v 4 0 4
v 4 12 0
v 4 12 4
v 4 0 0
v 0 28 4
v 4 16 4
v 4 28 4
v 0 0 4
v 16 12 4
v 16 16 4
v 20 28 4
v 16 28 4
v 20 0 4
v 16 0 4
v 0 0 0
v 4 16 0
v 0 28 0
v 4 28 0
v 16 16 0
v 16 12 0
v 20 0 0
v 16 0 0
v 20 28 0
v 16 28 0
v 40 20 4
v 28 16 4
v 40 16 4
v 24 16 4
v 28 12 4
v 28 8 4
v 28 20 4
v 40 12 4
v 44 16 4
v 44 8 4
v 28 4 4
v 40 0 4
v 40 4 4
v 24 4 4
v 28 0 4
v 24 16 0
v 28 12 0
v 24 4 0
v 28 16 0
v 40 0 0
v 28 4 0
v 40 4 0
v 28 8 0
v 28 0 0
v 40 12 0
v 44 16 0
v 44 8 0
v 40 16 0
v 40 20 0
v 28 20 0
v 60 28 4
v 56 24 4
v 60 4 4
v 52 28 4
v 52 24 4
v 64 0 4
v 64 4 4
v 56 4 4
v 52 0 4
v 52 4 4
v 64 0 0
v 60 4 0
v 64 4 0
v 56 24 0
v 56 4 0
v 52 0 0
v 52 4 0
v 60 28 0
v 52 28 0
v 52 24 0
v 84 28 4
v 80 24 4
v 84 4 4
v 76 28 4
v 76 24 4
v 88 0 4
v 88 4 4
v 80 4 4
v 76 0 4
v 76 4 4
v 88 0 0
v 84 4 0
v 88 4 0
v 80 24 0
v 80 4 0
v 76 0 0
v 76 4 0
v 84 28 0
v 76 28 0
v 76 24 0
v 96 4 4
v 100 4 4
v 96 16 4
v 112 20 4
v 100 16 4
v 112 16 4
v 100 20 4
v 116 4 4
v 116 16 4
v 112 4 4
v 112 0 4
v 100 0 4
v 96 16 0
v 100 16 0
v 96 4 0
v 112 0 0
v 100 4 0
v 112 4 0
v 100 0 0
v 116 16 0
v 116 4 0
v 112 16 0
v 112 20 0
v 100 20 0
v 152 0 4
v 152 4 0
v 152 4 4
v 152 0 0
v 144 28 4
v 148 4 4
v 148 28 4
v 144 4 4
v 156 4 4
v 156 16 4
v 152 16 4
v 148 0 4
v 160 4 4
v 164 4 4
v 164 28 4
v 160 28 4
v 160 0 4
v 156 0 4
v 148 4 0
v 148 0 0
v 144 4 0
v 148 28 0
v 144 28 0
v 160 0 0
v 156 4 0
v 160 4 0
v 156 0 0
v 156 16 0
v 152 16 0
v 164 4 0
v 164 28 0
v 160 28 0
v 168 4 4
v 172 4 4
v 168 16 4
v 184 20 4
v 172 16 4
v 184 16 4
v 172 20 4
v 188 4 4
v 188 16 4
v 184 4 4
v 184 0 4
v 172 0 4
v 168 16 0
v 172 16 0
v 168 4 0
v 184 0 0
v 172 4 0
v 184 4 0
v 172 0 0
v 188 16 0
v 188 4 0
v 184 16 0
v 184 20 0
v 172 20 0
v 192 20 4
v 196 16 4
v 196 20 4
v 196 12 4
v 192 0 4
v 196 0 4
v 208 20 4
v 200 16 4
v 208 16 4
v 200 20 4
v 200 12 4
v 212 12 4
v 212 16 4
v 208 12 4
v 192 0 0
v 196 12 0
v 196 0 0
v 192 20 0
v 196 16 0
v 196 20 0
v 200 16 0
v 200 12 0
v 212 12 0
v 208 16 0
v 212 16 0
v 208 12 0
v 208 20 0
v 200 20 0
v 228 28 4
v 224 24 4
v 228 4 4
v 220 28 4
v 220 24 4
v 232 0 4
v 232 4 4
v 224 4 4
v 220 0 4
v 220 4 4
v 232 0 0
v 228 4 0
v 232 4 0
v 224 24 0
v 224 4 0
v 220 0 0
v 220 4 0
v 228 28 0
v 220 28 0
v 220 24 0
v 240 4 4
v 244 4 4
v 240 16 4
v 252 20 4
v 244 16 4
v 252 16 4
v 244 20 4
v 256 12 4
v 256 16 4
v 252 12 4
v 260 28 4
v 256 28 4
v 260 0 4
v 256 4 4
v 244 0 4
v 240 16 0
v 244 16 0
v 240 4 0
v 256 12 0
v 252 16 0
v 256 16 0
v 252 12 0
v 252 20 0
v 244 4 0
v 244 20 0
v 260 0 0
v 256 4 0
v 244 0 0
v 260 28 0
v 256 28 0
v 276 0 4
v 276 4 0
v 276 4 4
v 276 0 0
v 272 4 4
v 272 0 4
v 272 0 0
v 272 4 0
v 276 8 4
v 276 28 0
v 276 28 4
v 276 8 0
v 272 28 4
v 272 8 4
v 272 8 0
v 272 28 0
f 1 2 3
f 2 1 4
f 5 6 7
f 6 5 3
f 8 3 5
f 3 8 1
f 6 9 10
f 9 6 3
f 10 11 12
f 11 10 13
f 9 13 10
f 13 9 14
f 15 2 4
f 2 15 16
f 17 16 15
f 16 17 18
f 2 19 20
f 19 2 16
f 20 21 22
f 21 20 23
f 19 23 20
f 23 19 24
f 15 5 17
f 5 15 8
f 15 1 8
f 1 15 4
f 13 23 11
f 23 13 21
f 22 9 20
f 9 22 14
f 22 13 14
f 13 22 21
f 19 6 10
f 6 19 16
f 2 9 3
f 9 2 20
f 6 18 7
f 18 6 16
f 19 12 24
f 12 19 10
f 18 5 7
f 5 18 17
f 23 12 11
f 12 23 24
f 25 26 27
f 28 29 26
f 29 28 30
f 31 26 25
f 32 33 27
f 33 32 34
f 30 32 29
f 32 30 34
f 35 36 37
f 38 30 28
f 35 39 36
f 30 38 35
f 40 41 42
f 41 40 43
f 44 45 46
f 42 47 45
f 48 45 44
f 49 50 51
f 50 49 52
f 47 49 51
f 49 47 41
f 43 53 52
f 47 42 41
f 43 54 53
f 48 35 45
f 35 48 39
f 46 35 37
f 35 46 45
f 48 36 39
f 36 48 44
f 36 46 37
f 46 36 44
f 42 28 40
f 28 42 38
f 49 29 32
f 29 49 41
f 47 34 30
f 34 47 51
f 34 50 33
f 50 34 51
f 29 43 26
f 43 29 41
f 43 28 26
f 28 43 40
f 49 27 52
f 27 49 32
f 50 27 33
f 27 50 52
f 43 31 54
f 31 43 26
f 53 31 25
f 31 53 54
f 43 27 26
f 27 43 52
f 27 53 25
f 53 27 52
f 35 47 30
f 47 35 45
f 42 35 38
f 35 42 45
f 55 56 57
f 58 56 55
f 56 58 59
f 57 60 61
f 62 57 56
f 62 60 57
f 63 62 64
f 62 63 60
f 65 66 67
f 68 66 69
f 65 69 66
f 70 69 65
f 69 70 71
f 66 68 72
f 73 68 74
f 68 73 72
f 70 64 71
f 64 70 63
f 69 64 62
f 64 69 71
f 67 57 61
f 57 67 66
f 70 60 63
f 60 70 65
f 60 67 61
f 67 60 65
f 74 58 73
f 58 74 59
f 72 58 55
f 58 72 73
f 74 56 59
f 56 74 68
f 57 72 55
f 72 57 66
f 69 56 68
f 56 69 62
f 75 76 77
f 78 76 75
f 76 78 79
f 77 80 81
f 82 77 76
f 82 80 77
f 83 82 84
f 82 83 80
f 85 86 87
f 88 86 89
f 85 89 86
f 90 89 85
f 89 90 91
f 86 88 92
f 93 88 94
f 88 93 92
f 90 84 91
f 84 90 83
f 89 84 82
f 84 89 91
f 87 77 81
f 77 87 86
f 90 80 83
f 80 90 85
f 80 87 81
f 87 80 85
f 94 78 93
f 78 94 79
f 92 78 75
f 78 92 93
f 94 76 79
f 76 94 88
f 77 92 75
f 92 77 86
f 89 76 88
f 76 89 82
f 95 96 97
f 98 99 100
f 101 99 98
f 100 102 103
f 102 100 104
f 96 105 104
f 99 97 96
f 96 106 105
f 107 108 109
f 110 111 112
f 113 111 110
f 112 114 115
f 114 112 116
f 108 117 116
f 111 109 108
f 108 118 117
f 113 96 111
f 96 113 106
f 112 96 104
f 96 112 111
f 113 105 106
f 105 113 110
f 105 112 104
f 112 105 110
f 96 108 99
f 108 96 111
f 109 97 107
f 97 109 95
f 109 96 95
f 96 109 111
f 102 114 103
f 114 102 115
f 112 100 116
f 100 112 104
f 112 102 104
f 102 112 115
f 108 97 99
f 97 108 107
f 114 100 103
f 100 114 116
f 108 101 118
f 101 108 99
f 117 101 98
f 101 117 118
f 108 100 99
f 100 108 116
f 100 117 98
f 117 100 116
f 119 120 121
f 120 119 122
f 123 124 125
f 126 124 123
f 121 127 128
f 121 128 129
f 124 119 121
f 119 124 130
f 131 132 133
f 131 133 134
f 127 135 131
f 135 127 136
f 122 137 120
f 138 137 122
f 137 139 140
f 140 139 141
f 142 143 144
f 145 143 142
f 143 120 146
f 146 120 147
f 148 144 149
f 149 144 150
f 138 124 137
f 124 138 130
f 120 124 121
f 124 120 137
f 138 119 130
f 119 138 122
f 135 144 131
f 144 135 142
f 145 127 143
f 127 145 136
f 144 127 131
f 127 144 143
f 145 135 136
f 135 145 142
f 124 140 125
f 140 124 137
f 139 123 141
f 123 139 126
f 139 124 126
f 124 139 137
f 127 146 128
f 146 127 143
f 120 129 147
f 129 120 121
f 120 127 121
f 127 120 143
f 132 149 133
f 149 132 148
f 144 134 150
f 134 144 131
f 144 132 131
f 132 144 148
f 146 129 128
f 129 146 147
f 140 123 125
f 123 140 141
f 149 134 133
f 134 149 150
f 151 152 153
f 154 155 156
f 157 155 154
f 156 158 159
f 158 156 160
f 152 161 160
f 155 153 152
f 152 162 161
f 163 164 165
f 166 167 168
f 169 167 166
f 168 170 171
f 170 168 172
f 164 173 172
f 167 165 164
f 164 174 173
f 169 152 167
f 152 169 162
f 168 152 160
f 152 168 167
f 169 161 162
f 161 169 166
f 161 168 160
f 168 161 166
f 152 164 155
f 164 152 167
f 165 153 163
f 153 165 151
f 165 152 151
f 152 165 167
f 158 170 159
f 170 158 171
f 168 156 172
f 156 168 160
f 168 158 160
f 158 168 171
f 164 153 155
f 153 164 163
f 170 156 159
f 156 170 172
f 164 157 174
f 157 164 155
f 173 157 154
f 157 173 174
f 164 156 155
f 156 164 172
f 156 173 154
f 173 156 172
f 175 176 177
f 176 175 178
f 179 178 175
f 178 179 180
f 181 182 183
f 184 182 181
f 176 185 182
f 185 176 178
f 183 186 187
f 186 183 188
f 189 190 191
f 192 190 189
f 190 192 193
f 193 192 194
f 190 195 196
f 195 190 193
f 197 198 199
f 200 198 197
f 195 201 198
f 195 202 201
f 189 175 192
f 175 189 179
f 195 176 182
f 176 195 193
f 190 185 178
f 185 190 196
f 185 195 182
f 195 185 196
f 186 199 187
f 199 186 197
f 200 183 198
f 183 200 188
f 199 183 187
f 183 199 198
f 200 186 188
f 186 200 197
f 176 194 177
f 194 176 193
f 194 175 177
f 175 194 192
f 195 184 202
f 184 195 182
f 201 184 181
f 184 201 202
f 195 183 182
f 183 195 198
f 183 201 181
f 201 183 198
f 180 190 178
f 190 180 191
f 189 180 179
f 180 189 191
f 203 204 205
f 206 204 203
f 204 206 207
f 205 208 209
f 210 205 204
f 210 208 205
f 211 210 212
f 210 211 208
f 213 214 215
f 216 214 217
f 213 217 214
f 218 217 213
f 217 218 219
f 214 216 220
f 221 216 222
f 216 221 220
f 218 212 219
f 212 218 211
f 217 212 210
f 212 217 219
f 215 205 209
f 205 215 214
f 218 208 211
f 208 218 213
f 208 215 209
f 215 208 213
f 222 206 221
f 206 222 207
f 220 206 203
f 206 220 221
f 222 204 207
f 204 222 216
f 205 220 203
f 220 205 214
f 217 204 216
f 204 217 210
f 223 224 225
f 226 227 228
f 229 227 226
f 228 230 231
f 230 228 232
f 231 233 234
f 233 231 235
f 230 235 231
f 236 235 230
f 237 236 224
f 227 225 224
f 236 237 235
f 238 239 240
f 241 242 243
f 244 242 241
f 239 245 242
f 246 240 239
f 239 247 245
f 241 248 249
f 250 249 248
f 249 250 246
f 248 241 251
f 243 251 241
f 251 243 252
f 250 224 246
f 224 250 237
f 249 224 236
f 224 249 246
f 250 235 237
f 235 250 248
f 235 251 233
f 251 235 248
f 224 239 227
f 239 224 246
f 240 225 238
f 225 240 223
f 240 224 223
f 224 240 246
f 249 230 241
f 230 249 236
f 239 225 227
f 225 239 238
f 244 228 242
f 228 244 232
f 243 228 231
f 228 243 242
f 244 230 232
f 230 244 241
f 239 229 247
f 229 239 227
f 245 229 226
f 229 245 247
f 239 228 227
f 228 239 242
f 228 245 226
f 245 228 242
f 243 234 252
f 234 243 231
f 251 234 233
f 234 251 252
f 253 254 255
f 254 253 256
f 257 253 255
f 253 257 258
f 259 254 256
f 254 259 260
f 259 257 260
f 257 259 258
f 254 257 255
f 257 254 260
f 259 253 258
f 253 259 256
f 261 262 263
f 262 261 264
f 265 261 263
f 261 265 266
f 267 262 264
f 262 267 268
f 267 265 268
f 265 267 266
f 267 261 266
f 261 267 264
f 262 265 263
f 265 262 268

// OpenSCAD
// Draw text
scale([ 4, 4, 4 ]) drawtext("Hello World!");

// Draw character set
// scale([2,2,2]) drawtext(" !\"#$%&'()*+,-./0123456789:;<=>?@ABCDEFGHIJKLMNOPQRSTUVWXYZ[\\]^_`abcdefghijklmnopqrstuvwxyz{|}");

module drawtext(text) {
  // Characters
  chars = " !\"#$%&'()*+,-./0123456789:;<=>?@ABCDEFGHIJKLMNOPQRSTUVWXYZ[\\]^_`abcdefghijklmnopqrstuvwxyz{|}";

  // Chracter table defining 5x7 characters
  // Adapted from: http://www.geocities.com/dinceraydin/djlcdsim/chartable.js
  char_table = [ [ 0, 0, 0, 0, 0, 0, 0 ],
                 [ 4, 0, 4, 4, 4, 4, 4 ],
                 [ 0, 0, 0, 0, 10, 10, 10 ],
                 [ 10, 10, 31, 10, 31, 10, 10 ],
                 [ 4, 30, 5, 14, 20, 15, 4 ],
                 [ 3, 19, 8, 4, 2, 25, 24 ],
                 [ 13, 18, 21, 8, 20, 18, 12 ],
                 [ 0, 0, 0, 0, 8, 4, 12 ],
                 [ 2, 4, 8, 8, 8, 4, 2 ],
                 [ 8, 4, 2, 2, 2, 4, 8 ],
                 [ 0, 4, 21, 14, 21, 4, 0 ],
                 [ 0, 4, 4, 31, 4, 4, 0 ],
                 [ 8, 4, 12, 0, 0, 0, 0 ],
                 [ 0, 0, 0, 31, 0, 0, 0 ],
                 [ 12, 12, 0, 0, 0, 0, 0 ],
                 [ 0, 16, 8, 4, 2, 1, 0 ],
                 [ 14, 17, 25, 21, 19, 17, 14 ],
                 [ 14, 4, 4, 4, 4, 12, 4 ],
                 [ 31, 8, 4, 2, 1, 17, 14 ],
                 [ 14, 17, 1, 2, 4, 2, 31 ],
                 [ 2, 2, 31, 18, 10, 6, 2 ],
                 [ 14, 17, 1, 1, 30, 16, 31 ],
                 [ 14, 17, 17, 30, 16, 8, 6 ],
                 [ 8, 8, 8, 4, 2, 1, 31 ],
                 [ 14, 17, 17, 14, 17, 17, 14 ],
                 [ 12, 2, 1, 15, 17, 17, 14 ],
                 [ 0, 12, 12, 0, 12, 12, 0 ],
                 [ 8, 4, 12, 0, 12, 12, 0 ],
                 [ 2, 4, 8, 16, 8, 4, 2 ],
                 [ 0, 0, 31, 0, 31, 0, 0 ],
                 [ 16, 8, 4, 2, 4, 8, 16 ],
                 [ 4, 0, 4, 2, 1, 17, 14 ],
                 [ 14, 21, 21, 13, 1, 17, 14 ],
                 [ 17, 17, 31, 17, 17, 17, 14 ],
                 [ 30, 17, 17, 30, 17, 17, 30 ],
                 [ 14, 17, 16, 16, 16, 17, 14 ],
                 [ 30, 17, 17, 17, 17, 17, 30 ],
                 [ 31, 16, 16, 30, 16, 16, 31 ],
                 [ 16, 16, 16, 30, 16, 16, 31 ],
                 [ 15, 17, 17, 23, 16, 17, 14 ],
                 [ 17, 17, 17, 31, 17, 17, 17 ],
                 [ 14, 4, 4, 4, 4, 4, 14 ],
                 [ 12, 18, 2, 2, 2, 2, 7 ],
                 [ 17, 18, 20, 24, 20, 18, 17 ],
                 [ 31, 16, 16, 16, 16, 16, 16 ],
                 [ 17, 17, 17, 21, 21, 27, 17 ],
                 [ 17, 17, 19, 21, 25, 17, 17 ],
                 [ 14, 17, 17, 17, 17, 17, 14 ],
                 [ 16, 16, 16, 30, 17, 17, 30 ],
                 [ 13, 18, 21, 17, 17, 17, 14 ],
                 [ 17, 18, 20, 30, 17, 17, 30 ],
                 [ 30, 1, 1, 14, 16, 16, 15 ],
                 [ 4, 4, 4, 4, 4, 4, 31 ],
                 [ 14, 17, 17, 17, 17, 17, 17 ],
                 [ 4, 10, 17, 17, 17, 17, 17 ],
                 [ 10, 21, 21, 21, 17, 17, 17 ],
                 [ 17, 17, 10, 4, 10, 17, 17 ],
                 [ 4, 4, 4, 10, 17, 17, 17 ],
                 [ 31, 16, 8, 4, 2, 1, 31 ],
                 [ 14, 8, 8, 8, 8, 8, 14 ],
                 [ 0, 1, 2, 4, 8, 16, 0 ],
                 [ 14, 2, 2, 2, 2, 2, 14 ],
                 [ 0, 0, 0, 0, 17, 10, 4 ],
                 [ 31, 0, 0, 0, 0, 0, 0 ],
                 [ 0, 0, 0, 0, 2, 4, 8 ],
                 [ 15, 17, 15, 1, 14, 0, 0 ],
                 [ 30, 17, 17, 25, 22, 16, 16 ],
                 [ 14, 17, 16, 16, 14, 0, 0 ],
                 [ 15, 17, 17, 19, 13, 1, 1 ],
                 [ 14, 16, 31, 17, 14, 0, 0 ],
                 [ 8, 8, 8, 28, 8, 9, 6 ],
                 [ 14, 1, 15, 17, 15, 0, 0 ],
                 [ 17, 17, 17, 25, 22, 16, 16 ],
                 [ 14, 4, 4, 4, 12, 0, 4 ],
                 [ 12, 18, 2, 2, 2, 6, 2 ],
                 [ 18, 20, 24, 20, 18, 16, 16 ],
                 [ 14, 4, 4, 4, 4, 4, 12 ],
                 [ 17, 17, 21, 21, 26, 0, 0 ],
                 [ 17, 17, 17, 25, 22, 0, 0 ],
                 [ 14, 17, 17, 17, 14, 0, 0 ],
                 [ 16, 16, 30, 17, 30, 0, 0 ],
                 [ 1, 1, 15, 19, 13, 0, 0 ],
                 [ 16, 16, 16, 25, 22, 0, 0 ],
                 [ 30, 1, 14, 16, 15, 0, 0 ],
                 [ 6, 9, 8, 8, 28, 8, 8 ],
                 [ 13, 19, 17, 17, 17, 0, 0 ],
                 [ 4, 10, 17, 17, 17, 0, 0 ],
                 [ 10, 21, 21, 17, 17, 0, 0 ],
                 [ 17, 10, 4, 10, 17, 0, 0 ],
                 [ 14, 1, 15, 17, 17, 0, 0 ],
                 [ 31, 8, 4, 2, 31, 0, 0 ],
                 [ 2, 4, 4, 8, 4, 4, 2 ],
                 [ 4, 4, 4, 4, 4, 4, 4 ],
                 [ 8, 4, 4, 2, 4, 4, 8 ] ];

  // Binary decode table
  dec_table = [ "00000", "00001", "00010", "00011", "00100", "00101",
                "00110", "00111", "01000", "01001", "01010", "01011",
                "01100", "01101", "01110", "01111", "10000", "10001",
                "10010", "10011", "10100", "10101", "10110", "10111",
                "11000", "11001", "11010", "11011", "11100", "11101",
                "11110", "11111" ];

  // Process string one character at a time
  for (itext = [0:len(text) - 1])
  {
    // Convert character to index
    ichar = search(text[itext], chars, 1)[0];

    // Decode character - rows
    for (irow = [0:6])
    {
      // Select value to draw from table
      val = dec_table[char_table[ichar][irow]];

      // Decode character - cols
      for (icol = [0:4])
      {
        // Retrieve bit to draw
        bit = search(val[icol], "01", 1)[0];

        if (bit)
        {
          // Output cube
          translate([ icol + (6 * itext), irow, 0 ])
              cube([ 1.0001, 1.0001, 1 ]);
        }
      }
    }
  }
}
